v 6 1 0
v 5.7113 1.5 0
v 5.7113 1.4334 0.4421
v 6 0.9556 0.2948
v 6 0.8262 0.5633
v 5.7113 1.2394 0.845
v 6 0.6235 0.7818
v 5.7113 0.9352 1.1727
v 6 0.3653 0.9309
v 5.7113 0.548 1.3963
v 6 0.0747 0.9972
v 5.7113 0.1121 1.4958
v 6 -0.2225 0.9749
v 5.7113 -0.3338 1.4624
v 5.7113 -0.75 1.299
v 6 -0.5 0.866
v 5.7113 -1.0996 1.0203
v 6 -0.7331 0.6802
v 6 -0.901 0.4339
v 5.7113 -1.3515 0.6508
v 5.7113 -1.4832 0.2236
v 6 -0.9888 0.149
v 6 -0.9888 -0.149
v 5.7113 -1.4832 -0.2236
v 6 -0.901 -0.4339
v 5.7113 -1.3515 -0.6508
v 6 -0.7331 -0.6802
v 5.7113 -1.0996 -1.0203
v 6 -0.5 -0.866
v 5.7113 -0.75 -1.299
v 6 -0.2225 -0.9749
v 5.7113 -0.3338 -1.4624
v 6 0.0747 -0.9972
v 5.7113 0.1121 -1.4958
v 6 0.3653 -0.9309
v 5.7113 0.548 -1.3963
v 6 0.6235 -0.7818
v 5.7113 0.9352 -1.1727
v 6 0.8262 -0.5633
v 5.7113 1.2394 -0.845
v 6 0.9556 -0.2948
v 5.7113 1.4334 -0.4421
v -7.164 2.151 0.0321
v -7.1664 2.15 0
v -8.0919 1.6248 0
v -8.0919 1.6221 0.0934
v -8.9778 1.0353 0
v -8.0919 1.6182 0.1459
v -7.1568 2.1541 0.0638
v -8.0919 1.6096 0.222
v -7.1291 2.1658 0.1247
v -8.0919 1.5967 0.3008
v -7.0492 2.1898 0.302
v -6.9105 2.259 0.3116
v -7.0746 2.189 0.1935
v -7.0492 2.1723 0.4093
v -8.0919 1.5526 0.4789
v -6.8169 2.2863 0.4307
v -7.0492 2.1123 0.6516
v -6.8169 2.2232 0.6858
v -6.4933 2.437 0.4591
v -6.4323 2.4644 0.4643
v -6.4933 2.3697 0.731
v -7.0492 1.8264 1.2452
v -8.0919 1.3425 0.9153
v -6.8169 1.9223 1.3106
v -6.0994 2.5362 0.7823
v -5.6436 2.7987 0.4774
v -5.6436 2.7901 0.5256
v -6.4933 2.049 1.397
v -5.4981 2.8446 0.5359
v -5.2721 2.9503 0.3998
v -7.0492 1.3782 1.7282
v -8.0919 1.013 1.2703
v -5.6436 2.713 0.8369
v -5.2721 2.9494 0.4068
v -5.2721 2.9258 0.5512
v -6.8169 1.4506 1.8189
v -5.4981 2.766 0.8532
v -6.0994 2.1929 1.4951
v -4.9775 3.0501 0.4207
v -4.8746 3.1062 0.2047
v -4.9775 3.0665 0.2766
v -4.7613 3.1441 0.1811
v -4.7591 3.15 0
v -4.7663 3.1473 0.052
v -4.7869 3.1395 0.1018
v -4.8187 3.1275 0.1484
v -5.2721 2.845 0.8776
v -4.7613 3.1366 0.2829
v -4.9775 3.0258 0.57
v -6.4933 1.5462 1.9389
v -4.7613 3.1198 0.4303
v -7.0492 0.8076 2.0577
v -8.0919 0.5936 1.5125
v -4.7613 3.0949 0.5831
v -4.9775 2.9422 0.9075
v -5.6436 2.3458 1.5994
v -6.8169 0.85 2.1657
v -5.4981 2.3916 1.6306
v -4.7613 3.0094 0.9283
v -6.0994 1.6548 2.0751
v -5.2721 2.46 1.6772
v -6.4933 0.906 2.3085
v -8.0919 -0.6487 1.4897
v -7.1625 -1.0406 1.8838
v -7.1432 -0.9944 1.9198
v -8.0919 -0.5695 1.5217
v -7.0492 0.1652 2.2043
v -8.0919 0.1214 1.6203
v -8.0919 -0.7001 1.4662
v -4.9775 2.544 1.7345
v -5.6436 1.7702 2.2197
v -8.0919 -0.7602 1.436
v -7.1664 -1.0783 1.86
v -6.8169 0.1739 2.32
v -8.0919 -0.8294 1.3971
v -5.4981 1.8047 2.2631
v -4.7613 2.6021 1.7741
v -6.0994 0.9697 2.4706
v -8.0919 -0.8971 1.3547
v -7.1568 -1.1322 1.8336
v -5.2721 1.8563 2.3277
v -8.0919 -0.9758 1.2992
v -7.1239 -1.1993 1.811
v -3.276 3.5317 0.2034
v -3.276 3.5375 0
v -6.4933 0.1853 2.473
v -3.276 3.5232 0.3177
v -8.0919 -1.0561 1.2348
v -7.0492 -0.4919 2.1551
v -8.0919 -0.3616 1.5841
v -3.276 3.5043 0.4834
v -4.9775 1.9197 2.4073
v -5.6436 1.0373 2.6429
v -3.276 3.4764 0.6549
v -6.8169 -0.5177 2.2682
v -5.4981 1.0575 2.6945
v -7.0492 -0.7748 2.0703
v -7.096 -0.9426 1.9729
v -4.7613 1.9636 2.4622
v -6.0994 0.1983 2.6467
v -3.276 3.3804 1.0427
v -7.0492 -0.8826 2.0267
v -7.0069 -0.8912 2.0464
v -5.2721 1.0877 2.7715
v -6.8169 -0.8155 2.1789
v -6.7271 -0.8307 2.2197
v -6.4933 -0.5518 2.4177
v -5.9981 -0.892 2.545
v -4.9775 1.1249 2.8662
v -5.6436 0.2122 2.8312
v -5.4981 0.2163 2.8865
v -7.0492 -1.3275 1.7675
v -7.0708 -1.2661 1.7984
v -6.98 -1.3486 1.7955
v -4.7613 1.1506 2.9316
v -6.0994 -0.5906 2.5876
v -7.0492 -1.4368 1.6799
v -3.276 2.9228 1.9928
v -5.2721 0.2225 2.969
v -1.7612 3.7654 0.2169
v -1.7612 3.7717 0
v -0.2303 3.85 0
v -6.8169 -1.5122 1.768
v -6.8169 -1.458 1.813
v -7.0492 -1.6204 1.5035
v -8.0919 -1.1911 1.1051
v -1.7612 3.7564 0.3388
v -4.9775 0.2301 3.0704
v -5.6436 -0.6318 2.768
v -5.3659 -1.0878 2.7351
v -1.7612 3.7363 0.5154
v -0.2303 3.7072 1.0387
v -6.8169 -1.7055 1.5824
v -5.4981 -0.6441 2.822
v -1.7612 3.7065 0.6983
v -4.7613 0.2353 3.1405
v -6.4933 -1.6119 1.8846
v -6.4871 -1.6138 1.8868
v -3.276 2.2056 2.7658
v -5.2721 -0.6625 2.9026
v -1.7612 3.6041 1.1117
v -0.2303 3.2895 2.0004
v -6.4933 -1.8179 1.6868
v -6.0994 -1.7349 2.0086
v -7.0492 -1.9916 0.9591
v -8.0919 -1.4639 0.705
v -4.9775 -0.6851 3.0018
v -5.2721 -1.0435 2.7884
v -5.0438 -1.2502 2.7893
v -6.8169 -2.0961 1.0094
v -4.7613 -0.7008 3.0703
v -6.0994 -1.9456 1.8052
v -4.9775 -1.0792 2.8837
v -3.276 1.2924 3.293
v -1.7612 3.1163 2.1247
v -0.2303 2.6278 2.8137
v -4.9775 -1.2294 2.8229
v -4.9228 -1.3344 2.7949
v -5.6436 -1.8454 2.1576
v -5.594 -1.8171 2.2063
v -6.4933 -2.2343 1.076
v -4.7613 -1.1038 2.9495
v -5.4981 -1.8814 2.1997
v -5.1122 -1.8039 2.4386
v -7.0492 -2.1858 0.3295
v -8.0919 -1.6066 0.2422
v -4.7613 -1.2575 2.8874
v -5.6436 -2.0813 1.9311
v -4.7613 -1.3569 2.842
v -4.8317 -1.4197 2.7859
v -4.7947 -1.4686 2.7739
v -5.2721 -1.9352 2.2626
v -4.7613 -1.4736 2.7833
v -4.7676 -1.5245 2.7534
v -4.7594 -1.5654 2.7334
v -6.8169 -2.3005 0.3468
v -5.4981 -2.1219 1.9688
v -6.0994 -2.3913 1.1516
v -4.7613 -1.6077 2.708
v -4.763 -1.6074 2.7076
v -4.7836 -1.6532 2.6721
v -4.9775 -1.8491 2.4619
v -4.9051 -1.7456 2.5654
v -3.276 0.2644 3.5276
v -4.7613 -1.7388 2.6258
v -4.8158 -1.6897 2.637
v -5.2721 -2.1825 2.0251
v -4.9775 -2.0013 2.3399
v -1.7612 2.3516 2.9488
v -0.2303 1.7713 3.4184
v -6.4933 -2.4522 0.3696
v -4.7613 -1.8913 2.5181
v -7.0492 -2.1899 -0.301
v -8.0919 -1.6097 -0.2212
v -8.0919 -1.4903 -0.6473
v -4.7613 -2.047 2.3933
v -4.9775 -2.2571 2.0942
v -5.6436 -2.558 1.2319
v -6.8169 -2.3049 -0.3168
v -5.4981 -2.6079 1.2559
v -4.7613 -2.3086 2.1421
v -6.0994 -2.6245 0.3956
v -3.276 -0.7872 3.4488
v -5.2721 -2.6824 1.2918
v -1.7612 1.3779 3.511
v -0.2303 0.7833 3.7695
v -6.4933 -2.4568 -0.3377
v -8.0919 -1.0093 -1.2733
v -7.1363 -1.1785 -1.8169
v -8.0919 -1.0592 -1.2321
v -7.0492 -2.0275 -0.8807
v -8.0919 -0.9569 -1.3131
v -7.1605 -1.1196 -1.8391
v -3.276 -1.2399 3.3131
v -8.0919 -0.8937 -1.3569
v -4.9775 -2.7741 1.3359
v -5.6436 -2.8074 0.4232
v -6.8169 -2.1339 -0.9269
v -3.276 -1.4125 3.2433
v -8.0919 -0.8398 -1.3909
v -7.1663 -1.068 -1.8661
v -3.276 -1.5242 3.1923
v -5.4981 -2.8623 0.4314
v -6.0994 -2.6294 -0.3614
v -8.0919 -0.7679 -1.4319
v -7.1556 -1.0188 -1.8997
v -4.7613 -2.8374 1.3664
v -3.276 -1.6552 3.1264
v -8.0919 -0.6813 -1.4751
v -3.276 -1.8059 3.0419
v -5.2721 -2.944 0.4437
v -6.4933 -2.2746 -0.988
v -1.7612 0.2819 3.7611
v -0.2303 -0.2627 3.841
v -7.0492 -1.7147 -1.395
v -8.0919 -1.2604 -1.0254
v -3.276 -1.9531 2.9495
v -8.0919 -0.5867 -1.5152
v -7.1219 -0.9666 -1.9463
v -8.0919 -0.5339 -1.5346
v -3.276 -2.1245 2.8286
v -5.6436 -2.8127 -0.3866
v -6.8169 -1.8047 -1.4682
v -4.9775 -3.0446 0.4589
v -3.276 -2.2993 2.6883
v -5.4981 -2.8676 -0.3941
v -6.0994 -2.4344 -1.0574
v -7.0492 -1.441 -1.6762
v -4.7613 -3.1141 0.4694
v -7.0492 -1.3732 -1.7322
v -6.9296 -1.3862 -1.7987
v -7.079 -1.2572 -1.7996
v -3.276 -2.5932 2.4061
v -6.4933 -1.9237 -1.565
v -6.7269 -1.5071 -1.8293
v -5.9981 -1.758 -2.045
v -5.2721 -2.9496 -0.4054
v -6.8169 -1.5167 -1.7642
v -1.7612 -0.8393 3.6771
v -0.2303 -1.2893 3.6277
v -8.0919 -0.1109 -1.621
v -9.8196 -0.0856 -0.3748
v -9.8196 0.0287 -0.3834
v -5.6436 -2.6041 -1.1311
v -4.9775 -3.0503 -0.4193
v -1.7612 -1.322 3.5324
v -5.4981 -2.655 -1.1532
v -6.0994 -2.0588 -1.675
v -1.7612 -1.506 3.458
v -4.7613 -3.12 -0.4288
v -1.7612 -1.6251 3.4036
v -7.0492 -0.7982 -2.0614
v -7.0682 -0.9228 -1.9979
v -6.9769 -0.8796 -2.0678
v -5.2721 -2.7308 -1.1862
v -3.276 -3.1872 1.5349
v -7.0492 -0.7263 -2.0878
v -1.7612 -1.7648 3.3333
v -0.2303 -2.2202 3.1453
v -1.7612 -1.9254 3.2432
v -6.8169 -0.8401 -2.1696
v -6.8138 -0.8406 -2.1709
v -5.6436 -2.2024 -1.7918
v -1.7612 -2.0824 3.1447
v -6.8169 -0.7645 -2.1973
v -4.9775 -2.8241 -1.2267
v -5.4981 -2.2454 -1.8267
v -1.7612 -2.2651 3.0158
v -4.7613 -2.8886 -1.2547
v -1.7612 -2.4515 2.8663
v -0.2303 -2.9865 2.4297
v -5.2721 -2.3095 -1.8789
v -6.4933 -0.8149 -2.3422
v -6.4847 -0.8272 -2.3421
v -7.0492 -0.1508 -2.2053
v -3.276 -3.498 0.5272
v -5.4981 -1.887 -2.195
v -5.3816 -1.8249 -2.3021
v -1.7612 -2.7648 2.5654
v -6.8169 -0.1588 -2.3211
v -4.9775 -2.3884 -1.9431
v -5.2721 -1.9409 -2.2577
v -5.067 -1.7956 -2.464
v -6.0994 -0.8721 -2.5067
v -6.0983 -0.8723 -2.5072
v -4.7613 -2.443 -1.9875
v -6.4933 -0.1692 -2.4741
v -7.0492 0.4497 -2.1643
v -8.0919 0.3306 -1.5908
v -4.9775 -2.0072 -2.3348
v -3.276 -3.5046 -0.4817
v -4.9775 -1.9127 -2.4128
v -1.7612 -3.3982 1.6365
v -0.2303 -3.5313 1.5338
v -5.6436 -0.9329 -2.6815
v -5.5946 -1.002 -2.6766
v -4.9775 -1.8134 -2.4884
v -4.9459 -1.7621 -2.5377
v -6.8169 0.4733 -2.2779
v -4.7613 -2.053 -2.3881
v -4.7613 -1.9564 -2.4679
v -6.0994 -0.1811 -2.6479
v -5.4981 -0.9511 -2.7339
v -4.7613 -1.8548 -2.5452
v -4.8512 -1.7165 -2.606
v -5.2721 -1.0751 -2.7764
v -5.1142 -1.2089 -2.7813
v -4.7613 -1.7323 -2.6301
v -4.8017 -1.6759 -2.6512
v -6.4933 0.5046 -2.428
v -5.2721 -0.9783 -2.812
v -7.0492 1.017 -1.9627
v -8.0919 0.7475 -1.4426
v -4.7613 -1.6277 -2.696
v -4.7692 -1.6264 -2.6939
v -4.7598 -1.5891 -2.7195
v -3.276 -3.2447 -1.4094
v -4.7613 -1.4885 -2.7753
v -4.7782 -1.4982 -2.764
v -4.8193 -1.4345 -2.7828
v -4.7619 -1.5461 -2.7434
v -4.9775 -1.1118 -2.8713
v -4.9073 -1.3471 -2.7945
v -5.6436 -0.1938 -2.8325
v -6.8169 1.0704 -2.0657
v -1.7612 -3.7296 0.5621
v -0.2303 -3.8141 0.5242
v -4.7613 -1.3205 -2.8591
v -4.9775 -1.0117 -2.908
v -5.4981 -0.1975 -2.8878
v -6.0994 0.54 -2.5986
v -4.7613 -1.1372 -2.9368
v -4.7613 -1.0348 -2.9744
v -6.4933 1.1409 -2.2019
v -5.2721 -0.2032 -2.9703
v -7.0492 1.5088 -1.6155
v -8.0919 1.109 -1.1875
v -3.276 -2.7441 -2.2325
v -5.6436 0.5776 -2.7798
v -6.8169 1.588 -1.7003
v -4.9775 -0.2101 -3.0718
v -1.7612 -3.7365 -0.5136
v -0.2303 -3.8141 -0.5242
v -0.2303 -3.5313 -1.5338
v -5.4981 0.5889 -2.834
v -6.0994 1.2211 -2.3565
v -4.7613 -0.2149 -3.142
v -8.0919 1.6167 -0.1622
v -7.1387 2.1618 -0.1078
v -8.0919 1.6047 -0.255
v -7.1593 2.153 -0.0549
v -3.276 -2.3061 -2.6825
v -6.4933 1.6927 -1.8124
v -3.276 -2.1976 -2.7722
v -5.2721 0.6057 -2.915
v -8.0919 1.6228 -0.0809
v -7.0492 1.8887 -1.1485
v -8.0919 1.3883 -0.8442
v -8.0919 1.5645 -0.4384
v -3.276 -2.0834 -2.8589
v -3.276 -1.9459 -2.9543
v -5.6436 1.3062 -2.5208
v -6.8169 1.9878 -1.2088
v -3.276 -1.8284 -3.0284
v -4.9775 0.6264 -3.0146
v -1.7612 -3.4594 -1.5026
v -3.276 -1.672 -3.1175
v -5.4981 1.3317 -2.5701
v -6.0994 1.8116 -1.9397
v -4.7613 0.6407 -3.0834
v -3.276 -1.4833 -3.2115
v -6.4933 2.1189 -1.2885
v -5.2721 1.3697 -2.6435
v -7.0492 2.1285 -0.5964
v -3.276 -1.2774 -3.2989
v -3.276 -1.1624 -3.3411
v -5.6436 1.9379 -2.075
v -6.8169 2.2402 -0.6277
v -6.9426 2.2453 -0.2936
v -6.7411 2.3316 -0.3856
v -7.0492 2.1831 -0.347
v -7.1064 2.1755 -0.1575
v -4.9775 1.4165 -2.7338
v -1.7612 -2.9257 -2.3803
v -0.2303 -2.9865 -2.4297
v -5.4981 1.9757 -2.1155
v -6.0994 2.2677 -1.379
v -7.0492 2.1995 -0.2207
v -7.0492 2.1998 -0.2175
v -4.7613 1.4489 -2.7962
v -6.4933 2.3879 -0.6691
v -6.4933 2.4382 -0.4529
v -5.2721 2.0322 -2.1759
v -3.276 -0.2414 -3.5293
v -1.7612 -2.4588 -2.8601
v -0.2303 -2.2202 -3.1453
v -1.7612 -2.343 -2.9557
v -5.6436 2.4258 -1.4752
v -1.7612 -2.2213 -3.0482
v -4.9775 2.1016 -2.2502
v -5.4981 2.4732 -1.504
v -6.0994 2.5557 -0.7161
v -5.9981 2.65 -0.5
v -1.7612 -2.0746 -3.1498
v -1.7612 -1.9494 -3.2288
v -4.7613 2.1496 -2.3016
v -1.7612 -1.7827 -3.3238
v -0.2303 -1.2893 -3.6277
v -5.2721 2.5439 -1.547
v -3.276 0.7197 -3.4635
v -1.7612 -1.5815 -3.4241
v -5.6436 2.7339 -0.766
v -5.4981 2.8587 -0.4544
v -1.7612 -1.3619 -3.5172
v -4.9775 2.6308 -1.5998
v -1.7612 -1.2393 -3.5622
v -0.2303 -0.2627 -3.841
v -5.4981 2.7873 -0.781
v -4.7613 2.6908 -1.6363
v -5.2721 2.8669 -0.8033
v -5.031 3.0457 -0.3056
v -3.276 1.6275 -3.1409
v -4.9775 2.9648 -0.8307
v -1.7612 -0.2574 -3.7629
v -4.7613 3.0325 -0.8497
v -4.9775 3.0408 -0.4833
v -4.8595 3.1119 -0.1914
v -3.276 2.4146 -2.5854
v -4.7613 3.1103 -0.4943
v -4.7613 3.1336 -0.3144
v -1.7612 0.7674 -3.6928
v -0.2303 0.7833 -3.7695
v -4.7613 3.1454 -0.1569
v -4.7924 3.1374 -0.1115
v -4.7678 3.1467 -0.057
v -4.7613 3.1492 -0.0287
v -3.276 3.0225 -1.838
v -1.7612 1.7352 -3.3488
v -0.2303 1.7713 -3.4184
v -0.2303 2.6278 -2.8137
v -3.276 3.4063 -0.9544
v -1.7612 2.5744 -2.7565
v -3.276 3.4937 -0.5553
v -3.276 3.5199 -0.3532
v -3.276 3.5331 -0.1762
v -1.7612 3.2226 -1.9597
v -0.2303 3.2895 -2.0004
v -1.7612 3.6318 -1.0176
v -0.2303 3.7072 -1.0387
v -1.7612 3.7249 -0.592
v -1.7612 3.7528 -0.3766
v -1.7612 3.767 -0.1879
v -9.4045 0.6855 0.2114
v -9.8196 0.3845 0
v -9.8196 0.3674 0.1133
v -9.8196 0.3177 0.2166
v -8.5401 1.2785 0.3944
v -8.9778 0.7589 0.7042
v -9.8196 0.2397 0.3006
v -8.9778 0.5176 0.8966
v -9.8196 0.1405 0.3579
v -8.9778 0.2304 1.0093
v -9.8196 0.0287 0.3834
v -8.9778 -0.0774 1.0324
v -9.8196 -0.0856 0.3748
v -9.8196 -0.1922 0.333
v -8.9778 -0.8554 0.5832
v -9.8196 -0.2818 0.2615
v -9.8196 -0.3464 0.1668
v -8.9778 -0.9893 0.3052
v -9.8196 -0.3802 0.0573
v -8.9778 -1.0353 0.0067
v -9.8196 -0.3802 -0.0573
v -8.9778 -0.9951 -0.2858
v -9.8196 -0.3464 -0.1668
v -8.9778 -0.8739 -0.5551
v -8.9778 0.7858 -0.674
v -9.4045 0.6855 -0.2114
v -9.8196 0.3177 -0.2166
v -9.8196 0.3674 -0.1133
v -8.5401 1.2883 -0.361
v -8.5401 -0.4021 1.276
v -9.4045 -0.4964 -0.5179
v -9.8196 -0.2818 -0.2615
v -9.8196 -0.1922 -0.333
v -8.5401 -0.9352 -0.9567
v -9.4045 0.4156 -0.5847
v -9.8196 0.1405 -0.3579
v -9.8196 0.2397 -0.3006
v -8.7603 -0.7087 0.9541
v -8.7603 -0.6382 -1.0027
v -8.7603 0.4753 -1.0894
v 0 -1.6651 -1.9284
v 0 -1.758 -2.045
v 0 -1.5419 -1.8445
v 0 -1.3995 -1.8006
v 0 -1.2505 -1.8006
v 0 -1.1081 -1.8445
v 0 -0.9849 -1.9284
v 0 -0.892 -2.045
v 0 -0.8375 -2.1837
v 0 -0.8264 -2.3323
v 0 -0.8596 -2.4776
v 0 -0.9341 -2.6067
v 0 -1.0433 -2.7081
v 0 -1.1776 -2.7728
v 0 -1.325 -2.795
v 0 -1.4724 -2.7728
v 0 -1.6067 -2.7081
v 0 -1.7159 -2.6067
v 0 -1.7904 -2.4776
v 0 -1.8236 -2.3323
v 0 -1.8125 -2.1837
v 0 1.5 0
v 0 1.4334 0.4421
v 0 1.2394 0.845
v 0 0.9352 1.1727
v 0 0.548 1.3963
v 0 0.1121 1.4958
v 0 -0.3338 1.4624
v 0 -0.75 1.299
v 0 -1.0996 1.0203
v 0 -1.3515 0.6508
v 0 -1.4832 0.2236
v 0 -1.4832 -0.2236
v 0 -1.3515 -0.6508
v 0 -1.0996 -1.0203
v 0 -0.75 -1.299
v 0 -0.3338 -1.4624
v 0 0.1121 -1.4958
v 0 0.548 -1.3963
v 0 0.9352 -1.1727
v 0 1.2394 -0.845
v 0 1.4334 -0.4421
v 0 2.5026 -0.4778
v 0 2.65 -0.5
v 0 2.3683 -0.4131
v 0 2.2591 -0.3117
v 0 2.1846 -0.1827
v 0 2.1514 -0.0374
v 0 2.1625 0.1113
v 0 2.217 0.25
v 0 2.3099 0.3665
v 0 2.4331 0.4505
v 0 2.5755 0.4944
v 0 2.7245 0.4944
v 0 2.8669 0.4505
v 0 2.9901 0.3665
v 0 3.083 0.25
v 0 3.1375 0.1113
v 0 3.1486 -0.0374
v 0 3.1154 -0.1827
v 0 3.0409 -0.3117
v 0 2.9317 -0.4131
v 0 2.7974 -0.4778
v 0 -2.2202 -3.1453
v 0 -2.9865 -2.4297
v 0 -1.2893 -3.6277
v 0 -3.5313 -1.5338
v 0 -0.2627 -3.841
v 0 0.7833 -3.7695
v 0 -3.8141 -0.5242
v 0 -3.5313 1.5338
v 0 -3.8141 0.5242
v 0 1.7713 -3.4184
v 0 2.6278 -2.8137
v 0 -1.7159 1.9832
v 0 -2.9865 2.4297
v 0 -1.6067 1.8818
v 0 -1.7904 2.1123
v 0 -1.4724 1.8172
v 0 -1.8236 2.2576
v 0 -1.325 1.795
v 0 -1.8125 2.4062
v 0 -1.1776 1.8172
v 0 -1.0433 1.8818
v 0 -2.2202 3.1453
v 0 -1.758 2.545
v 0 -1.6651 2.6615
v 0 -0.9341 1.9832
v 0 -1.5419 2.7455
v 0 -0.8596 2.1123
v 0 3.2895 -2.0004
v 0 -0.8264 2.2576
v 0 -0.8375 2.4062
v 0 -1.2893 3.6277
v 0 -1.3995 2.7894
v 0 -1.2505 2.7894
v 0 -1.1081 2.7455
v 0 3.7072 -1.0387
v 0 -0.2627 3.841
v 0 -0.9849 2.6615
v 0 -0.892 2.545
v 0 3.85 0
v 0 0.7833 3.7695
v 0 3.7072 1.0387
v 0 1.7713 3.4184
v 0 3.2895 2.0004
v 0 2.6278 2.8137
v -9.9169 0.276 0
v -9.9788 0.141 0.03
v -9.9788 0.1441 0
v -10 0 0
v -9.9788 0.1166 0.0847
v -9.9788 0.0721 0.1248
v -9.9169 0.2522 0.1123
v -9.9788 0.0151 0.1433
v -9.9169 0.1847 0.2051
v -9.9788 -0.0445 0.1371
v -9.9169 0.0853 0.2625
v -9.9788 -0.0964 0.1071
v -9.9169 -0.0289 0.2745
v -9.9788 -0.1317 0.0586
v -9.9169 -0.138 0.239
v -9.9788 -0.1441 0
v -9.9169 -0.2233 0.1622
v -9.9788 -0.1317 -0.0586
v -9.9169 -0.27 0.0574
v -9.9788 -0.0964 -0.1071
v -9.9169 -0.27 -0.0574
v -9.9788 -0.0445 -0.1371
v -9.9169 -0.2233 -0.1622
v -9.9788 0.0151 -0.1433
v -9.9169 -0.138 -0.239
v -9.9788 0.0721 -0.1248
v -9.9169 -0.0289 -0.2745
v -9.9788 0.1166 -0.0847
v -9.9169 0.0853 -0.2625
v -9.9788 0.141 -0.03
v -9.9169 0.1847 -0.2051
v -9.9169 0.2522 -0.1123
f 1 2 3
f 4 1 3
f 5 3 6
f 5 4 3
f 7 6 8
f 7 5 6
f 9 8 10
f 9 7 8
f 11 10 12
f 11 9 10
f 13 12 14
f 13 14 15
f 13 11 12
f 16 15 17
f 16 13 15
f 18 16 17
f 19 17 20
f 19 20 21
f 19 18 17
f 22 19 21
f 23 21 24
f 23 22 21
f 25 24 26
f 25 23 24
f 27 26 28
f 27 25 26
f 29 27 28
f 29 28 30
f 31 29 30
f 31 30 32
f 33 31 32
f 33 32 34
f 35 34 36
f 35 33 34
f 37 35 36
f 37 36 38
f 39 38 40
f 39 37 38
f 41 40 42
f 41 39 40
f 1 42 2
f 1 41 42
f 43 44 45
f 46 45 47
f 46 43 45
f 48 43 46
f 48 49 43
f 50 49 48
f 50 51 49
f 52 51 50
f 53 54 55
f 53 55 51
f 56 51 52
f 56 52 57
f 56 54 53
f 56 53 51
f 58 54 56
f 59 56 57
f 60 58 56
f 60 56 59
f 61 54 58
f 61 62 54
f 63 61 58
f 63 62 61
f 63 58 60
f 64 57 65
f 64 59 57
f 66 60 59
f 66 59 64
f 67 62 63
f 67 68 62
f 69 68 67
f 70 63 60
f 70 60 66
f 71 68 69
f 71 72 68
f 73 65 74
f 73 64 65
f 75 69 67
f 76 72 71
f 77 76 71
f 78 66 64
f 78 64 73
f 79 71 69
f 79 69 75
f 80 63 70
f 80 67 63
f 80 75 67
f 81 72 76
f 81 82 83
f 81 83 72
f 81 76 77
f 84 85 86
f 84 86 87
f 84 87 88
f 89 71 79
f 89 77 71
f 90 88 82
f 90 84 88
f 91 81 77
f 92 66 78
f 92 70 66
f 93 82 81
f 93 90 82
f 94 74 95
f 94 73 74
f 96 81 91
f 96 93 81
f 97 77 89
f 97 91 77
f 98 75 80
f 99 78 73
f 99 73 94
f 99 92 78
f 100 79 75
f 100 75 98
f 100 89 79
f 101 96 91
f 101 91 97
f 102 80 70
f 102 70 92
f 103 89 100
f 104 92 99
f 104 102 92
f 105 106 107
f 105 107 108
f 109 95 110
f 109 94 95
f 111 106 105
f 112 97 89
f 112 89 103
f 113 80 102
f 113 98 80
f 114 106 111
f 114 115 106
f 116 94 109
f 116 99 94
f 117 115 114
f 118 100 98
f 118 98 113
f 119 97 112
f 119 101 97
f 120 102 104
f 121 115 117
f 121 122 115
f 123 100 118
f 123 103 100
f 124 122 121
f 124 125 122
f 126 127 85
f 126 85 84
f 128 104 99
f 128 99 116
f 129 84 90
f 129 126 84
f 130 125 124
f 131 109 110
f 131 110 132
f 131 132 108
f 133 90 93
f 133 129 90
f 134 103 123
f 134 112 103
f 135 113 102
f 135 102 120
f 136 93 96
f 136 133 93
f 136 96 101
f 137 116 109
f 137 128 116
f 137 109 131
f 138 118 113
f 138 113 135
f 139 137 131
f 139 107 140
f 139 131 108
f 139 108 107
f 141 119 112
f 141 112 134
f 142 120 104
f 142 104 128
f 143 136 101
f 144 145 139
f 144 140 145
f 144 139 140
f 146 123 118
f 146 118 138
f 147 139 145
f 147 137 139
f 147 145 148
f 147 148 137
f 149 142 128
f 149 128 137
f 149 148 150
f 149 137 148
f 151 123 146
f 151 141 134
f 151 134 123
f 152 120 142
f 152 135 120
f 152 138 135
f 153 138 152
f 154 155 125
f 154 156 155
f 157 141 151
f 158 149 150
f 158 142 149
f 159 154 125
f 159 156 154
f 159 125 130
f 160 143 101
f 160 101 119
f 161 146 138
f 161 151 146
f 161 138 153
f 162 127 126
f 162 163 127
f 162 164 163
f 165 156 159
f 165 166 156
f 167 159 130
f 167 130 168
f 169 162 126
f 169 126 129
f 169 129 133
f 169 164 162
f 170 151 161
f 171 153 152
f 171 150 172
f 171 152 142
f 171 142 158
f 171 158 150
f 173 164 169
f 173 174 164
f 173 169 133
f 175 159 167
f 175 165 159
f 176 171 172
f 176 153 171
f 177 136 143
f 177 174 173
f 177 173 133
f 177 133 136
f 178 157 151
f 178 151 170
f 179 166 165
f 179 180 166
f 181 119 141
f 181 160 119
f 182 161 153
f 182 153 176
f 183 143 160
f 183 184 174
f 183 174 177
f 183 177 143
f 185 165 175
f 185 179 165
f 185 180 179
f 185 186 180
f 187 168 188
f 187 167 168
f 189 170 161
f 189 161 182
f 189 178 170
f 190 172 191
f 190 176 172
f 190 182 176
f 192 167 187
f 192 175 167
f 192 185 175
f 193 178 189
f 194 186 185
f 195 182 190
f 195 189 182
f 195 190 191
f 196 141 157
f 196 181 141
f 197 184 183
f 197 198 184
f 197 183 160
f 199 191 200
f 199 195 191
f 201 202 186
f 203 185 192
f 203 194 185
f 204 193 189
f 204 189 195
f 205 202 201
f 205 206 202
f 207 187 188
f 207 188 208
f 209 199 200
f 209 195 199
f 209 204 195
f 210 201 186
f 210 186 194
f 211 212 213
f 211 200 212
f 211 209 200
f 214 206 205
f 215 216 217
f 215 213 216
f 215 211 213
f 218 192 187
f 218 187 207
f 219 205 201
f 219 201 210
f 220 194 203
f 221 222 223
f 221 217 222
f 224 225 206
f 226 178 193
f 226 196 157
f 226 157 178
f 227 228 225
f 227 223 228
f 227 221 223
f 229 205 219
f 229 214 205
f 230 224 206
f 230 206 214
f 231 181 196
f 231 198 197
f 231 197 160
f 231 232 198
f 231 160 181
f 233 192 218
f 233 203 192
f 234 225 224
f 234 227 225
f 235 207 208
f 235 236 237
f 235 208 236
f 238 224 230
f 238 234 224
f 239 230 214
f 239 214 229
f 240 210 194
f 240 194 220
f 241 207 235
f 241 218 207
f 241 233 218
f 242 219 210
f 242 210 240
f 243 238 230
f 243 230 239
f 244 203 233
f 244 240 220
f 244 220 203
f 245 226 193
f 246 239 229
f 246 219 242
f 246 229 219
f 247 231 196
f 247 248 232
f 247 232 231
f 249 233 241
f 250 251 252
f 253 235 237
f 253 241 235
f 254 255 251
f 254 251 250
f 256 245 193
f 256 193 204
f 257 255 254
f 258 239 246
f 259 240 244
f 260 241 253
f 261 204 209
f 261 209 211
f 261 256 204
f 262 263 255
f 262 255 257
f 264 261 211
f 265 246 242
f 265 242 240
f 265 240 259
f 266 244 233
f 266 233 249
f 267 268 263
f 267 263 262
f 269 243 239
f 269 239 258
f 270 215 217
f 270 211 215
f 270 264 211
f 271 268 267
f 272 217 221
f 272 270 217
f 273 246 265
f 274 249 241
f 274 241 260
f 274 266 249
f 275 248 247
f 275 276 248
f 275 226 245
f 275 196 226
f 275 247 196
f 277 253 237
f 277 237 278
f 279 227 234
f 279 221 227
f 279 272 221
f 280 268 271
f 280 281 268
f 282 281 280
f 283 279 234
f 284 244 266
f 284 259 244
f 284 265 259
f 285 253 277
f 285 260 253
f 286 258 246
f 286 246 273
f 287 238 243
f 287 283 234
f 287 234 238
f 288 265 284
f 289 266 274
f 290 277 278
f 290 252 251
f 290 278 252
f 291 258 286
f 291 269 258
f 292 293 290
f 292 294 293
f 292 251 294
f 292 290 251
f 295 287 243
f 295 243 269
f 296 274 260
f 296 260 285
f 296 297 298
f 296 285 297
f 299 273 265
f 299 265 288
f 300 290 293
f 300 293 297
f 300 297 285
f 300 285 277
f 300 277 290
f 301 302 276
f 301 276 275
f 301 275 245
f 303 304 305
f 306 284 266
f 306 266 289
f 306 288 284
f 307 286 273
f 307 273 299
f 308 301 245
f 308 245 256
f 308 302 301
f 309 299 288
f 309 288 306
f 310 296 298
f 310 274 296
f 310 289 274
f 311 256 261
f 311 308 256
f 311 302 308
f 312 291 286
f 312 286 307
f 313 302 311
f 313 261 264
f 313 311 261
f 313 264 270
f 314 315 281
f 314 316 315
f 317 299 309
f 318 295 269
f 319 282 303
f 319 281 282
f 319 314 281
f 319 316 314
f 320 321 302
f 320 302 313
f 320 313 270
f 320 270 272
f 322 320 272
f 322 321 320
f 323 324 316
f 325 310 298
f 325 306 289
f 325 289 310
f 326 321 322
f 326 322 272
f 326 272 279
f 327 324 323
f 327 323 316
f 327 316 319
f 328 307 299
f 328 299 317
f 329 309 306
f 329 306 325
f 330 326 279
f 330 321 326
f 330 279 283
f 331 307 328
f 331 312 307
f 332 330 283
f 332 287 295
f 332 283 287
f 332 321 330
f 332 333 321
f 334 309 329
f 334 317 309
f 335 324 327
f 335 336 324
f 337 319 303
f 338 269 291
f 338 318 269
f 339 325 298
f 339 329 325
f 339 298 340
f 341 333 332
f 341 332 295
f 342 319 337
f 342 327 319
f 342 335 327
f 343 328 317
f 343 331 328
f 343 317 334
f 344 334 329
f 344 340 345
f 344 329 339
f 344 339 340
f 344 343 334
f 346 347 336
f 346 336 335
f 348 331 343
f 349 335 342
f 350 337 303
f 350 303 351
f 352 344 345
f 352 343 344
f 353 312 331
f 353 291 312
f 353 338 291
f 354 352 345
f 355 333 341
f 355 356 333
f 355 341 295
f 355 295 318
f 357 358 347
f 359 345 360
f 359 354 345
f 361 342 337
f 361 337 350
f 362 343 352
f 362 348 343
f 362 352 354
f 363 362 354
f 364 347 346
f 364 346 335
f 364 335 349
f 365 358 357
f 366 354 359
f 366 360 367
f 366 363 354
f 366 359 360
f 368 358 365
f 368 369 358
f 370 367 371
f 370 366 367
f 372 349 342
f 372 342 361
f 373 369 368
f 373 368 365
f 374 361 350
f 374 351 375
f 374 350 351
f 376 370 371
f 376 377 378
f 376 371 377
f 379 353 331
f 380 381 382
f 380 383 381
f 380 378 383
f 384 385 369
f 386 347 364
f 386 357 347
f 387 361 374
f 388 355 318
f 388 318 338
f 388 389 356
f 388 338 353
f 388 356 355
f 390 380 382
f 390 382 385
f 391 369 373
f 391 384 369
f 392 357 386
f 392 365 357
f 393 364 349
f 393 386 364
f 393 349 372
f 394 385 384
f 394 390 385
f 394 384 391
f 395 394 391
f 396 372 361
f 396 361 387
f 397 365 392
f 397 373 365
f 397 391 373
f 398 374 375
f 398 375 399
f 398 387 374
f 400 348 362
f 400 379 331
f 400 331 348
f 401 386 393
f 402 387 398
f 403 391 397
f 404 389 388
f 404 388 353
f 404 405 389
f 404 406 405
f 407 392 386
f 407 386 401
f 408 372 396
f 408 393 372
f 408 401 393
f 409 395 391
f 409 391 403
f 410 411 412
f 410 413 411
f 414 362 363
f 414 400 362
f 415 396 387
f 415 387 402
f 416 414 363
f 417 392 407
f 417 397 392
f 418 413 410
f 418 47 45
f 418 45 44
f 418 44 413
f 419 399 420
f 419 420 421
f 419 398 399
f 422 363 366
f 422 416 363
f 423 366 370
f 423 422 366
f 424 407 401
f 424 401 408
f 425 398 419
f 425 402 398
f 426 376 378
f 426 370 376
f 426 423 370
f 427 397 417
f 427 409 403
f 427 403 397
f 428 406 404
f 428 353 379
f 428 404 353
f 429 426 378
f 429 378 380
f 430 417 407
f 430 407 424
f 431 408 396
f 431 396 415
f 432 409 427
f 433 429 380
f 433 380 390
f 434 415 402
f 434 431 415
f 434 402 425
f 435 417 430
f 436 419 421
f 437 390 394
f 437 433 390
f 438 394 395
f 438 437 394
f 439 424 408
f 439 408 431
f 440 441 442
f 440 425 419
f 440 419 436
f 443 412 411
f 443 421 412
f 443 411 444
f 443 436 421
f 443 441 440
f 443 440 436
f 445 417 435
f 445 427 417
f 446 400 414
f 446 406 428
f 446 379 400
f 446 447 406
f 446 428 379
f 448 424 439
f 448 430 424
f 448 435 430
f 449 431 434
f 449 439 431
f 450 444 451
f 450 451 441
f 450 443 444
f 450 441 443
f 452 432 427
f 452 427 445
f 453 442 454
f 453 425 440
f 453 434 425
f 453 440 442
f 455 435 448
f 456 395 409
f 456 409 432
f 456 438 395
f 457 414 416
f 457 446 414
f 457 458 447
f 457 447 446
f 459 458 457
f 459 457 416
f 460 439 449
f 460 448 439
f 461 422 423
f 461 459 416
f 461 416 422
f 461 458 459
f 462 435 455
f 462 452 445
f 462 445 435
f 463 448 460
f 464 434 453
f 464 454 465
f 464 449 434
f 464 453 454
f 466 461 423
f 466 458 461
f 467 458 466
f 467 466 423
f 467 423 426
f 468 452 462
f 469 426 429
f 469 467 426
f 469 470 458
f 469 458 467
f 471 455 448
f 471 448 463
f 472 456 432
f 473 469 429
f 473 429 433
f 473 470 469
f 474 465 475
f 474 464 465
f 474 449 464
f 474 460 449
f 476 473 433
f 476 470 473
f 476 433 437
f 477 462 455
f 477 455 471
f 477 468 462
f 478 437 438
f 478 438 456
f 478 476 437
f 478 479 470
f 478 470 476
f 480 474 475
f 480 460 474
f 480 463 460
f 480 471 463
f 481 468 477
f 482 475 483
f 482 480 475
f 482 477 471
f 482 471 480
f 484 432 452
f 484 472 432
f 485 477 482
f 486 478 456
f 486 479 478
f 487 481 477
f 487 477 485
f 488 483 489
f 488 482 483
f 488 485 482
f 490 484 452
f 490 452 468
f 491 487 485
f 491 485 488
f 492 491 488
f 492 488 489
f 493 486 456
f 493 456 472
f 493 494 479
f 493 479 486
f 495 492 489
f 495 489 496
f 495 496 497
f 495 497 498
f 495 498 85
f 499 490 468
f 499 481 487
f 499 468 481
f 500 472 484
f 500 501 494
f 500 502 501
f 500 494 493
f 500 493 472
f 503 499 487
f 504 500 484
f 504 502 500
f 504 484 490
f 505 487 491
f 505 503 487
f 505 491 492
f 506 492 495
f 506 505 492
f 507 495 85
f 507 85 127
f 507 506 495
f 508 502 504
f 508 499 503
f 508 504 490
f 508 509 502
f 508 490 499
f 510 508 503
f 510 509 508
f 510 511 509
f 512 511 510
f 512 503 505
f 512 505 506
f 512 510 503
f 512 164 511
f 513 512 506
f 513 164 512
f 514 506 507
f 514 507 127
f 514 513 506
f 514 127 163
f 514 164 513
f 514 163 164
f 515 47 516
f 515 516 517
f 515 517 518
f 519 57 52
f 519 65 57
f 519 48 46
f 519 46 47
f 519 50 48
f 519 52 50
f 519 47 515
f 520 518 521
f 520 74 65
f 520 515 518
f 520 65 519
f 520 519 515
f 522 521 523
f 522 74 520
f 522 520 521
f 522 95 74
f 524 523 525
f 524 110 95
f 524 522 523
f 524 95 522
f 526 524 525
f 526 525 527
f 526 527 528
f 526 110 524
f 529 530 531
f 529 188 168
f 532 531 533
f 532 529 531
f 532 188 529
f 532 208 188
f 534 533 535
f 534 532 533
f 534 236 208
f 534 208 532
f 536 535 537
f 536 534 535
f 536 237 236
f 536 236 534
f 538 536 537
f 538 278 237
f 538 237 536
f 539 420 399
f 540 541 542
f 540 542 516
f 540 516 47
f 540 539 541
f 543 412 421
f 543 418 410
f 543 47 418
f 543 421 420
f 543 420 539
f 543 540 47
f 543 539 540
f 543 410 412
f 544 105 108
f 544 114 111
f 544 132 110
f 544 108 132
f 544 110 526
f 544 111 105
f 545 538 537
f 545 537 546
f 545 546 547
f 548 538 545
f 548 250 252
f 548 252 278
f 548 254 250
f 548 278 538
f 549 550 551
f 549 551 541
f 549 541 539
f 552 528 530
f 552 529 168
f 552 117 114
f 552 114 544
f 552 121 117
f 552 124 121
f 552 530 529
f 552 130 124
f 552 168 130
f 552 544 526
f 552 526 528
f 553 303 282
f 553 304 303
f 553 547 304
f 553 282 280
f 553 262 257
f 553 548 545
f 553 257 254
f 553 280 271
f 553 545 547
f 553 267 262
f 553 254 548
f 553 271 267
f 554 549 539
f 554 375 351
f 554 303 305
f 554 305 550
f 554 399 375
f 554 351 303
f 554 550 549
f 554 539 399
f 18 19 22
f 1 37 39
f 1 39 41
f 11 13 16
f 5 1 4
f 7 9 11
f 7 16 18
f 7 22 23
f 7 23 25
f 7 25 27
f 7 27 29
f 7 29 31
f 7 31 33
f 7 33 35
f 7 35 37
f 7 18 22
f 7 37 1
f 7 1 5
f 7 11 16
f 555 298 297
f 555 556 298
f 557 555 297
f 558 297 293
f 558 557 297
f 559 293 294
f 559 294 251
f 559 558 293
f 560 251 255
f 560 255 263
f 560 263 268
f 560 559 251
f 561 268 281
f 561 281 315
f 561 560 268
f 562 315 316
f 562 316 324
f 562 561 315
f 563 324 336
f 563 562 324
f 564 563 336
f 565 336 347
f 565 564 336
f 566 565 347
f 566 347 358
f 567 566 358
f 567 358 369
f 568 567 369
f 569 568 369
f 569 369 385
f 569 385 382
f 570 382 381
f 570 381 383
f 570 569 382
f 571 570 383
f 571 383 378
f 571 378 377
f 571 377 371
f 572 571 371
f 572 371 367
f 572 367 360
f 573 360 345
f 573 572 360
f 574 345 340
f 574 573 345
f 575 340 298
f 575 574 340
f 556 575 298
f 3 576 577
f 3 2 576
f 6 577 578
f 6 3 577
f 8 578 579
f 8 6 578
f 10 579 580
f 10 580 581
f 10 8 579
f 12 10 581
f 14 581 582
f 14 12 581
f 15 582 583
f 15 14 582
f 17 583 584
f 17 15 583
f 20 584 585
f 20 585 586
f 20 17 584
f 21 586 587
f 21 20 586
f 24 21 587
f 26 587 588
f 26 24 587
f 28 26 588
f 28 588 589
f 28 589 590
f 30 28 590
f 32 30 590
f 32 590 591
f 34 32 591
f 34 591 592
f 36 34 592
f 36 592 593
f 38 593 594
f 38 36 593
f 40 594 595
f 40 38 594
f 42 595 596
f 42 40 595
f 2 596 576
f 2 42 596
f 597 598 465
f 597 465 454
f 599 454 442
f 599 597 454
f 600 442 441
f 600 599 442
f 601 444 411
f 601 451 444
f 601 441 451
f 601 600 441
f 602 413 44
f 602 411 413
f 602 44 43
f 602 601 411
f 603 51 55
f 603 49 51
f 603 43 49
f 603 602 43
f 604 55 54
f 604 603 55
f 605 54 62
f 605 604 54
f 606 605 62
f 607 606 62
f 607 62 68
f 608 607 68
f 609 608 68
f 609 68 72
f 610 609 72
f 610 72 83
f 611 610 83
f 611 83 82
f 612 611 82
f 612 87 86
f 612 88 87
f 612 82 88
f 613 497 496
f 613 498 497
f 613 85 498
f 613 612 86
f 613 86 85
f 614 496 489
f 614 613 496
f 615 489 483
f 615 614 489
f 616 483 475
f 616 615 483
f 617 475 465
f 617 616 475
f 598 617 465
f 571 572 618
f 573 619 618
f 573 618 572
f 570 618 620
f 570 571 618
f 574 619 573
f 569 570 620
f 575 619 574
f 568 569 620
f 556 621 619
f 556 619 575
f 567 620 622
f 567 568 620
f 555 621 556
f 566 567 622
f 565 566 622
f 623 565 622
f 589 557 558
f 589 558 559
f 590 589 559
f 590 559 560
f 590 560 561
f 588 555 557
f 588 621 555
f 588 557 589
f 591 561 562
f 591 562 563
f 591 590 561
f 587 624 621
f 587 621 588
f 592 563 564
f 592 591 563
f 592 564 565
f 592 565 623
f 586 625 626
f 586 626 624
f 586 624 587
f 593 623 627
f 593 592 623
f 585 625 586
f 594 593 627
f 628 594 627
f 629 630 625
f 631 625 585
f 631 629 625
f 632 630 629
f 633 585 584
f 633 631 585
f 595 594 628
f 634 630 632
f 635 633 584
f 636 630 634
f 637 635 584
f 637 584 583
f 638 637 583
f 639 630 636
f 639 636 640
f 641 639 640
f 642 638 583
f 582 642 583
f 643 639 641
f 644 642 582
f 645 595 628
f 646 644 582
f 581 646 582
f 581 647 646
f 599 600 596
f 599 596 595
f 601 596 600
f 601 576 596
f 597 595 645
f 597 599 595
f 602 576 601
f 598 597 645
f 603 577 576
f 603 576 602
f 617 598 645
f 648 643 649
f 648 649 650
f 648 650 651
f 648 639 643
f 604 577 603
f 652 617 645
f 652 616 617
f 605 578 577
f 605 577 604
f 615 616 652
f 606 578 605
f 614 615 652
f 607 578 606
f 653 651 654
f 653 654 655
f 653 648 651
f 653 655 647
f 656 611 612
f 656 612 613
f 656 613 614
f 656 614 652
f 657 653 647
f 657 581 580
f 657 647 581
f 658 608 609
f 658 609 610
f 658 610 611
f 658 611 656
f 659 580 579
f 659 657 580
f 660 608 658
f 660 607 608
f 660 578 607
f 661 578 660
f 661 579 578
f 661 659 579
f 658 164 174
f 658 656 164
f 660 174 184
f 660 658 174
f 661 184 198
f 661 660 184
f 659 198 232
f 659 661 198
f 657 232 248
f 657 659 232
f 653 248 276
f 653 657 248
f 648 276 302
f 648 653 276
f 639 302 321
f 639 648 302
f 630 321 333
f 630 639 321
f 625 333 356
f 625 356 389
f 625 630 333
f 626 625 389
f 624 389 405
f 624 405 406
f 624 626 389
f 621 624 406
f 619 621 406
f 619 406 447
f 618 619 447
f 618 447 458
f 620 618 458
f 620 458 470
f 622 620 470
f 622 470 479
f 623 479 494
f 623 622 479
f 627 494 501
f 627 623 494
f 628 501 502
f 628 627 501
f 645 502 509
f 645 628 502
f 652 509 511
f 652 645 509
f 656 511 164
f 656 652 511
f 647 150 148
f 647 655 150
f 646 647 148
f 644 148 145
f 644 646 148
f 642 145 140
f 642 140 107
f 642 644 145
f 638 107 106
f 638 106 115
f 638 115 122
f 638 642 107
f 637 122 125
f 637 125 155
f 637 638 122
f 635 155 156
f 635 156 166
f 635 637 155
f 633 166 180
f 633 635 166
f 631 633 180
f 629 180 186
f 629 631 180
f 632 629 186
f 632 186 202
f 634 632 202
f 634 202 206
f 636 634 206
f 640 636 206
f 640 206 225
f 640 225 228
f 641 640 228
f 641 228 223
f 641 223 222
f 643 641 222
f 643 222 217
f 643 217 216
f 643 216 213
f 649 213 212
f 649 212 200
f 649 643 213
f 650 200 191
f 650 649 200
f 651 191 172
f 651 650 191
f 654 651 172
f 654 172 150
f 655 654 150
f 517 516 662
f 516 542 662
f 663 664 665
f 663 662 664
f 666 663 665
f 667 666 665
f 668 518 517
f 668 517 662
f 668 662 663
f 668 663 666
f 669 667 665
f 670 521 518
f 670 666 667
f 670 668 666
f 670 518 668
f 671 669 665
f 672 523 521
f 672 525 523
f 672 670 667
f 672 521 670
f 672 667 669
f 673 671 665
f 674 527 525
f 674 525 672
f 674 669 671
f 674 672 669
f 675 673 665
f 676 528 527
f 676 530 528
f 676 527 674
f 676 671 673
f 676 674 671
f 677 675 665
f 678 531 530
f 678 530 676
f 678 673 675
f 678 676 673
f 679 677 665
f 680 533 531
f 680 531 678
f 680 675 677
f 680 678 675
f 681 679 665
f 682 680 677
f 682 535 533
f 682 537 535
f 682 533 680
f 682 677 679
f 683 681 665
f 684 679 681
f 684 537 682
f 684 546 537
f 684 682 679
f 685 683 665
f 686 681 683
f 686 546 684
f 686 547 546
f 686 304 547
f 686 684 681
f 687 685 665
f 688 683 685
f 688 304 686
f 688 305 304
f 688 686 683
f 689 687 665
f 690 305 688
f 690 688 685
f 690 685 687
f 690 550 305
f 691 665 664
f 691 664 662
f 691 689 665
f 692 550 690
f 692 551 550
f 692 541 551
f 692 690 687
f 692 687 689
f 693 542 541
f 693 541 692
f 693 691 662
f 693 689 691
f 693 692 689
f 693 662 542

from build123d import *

# Parameters (mm, degrees)
CIRPATTERN1_COUNT = 3


with BuildPart() as part:
    # Sketch1 → Revolve1 (revolve)
    with BuildSketch(Plane.XY):
        with BuildLine():
            Line((0, 3.85), (0, 1.5))
            Line((0, 1.5), (5.711324865, 1.5))
            Line((5.711324865, 1.5), (6, 1))
            Line((6, 1), (6, 0))
            Line((6, 0), (-10, 0))
            ThreePointArc((-10, 0), (-9.952671274, 0.212341041), (-9.819645129, 0.384482759))
            ThreePointArc((-9.819645129, 0.384482759), (-5.328465382, 2.957041529), (-0.230291267, 3.85))
            Line((-0.230291267, 3.85), (0, 3.85))
        make_face()
    revolve(axis=Axis((-88.99, 0, 0), (1, 0, 0)))

    # Sketch5 → Ø1.0mm Dowel Hole1 (revolve, cut)
    with BuildSketch(Plane(origin=(0, 2.65, 0), x_dir=(0, 0, -1), z_dir=(0, 1, 0))):
        Polygon((0, 0), (0, 8.80043031), (0.5, 8.5), (0.5, 0), align=None)
    f_1_0mm_dowel_hole1 = revolve(axis=Axis((6.35, 2.65, 0), (-1, 0, 0)), mode=Mode.SUBTRACT)

    # CirPattern1: Ø1.0mm Dowel Hole1 ×3 about axis
    cirpattern1_axis = Axis((0, 0, 0), (1, 0, 0))
    for i in range(1, CIRPATTERN1_COUNT):
        add(f_1_0mm_dowel_hole1.rotate(cirpattern1_axis, i * 360 / CIRPATTERN1_COUNT), mode=Mode.SUBTRACT)


solid = part.part
